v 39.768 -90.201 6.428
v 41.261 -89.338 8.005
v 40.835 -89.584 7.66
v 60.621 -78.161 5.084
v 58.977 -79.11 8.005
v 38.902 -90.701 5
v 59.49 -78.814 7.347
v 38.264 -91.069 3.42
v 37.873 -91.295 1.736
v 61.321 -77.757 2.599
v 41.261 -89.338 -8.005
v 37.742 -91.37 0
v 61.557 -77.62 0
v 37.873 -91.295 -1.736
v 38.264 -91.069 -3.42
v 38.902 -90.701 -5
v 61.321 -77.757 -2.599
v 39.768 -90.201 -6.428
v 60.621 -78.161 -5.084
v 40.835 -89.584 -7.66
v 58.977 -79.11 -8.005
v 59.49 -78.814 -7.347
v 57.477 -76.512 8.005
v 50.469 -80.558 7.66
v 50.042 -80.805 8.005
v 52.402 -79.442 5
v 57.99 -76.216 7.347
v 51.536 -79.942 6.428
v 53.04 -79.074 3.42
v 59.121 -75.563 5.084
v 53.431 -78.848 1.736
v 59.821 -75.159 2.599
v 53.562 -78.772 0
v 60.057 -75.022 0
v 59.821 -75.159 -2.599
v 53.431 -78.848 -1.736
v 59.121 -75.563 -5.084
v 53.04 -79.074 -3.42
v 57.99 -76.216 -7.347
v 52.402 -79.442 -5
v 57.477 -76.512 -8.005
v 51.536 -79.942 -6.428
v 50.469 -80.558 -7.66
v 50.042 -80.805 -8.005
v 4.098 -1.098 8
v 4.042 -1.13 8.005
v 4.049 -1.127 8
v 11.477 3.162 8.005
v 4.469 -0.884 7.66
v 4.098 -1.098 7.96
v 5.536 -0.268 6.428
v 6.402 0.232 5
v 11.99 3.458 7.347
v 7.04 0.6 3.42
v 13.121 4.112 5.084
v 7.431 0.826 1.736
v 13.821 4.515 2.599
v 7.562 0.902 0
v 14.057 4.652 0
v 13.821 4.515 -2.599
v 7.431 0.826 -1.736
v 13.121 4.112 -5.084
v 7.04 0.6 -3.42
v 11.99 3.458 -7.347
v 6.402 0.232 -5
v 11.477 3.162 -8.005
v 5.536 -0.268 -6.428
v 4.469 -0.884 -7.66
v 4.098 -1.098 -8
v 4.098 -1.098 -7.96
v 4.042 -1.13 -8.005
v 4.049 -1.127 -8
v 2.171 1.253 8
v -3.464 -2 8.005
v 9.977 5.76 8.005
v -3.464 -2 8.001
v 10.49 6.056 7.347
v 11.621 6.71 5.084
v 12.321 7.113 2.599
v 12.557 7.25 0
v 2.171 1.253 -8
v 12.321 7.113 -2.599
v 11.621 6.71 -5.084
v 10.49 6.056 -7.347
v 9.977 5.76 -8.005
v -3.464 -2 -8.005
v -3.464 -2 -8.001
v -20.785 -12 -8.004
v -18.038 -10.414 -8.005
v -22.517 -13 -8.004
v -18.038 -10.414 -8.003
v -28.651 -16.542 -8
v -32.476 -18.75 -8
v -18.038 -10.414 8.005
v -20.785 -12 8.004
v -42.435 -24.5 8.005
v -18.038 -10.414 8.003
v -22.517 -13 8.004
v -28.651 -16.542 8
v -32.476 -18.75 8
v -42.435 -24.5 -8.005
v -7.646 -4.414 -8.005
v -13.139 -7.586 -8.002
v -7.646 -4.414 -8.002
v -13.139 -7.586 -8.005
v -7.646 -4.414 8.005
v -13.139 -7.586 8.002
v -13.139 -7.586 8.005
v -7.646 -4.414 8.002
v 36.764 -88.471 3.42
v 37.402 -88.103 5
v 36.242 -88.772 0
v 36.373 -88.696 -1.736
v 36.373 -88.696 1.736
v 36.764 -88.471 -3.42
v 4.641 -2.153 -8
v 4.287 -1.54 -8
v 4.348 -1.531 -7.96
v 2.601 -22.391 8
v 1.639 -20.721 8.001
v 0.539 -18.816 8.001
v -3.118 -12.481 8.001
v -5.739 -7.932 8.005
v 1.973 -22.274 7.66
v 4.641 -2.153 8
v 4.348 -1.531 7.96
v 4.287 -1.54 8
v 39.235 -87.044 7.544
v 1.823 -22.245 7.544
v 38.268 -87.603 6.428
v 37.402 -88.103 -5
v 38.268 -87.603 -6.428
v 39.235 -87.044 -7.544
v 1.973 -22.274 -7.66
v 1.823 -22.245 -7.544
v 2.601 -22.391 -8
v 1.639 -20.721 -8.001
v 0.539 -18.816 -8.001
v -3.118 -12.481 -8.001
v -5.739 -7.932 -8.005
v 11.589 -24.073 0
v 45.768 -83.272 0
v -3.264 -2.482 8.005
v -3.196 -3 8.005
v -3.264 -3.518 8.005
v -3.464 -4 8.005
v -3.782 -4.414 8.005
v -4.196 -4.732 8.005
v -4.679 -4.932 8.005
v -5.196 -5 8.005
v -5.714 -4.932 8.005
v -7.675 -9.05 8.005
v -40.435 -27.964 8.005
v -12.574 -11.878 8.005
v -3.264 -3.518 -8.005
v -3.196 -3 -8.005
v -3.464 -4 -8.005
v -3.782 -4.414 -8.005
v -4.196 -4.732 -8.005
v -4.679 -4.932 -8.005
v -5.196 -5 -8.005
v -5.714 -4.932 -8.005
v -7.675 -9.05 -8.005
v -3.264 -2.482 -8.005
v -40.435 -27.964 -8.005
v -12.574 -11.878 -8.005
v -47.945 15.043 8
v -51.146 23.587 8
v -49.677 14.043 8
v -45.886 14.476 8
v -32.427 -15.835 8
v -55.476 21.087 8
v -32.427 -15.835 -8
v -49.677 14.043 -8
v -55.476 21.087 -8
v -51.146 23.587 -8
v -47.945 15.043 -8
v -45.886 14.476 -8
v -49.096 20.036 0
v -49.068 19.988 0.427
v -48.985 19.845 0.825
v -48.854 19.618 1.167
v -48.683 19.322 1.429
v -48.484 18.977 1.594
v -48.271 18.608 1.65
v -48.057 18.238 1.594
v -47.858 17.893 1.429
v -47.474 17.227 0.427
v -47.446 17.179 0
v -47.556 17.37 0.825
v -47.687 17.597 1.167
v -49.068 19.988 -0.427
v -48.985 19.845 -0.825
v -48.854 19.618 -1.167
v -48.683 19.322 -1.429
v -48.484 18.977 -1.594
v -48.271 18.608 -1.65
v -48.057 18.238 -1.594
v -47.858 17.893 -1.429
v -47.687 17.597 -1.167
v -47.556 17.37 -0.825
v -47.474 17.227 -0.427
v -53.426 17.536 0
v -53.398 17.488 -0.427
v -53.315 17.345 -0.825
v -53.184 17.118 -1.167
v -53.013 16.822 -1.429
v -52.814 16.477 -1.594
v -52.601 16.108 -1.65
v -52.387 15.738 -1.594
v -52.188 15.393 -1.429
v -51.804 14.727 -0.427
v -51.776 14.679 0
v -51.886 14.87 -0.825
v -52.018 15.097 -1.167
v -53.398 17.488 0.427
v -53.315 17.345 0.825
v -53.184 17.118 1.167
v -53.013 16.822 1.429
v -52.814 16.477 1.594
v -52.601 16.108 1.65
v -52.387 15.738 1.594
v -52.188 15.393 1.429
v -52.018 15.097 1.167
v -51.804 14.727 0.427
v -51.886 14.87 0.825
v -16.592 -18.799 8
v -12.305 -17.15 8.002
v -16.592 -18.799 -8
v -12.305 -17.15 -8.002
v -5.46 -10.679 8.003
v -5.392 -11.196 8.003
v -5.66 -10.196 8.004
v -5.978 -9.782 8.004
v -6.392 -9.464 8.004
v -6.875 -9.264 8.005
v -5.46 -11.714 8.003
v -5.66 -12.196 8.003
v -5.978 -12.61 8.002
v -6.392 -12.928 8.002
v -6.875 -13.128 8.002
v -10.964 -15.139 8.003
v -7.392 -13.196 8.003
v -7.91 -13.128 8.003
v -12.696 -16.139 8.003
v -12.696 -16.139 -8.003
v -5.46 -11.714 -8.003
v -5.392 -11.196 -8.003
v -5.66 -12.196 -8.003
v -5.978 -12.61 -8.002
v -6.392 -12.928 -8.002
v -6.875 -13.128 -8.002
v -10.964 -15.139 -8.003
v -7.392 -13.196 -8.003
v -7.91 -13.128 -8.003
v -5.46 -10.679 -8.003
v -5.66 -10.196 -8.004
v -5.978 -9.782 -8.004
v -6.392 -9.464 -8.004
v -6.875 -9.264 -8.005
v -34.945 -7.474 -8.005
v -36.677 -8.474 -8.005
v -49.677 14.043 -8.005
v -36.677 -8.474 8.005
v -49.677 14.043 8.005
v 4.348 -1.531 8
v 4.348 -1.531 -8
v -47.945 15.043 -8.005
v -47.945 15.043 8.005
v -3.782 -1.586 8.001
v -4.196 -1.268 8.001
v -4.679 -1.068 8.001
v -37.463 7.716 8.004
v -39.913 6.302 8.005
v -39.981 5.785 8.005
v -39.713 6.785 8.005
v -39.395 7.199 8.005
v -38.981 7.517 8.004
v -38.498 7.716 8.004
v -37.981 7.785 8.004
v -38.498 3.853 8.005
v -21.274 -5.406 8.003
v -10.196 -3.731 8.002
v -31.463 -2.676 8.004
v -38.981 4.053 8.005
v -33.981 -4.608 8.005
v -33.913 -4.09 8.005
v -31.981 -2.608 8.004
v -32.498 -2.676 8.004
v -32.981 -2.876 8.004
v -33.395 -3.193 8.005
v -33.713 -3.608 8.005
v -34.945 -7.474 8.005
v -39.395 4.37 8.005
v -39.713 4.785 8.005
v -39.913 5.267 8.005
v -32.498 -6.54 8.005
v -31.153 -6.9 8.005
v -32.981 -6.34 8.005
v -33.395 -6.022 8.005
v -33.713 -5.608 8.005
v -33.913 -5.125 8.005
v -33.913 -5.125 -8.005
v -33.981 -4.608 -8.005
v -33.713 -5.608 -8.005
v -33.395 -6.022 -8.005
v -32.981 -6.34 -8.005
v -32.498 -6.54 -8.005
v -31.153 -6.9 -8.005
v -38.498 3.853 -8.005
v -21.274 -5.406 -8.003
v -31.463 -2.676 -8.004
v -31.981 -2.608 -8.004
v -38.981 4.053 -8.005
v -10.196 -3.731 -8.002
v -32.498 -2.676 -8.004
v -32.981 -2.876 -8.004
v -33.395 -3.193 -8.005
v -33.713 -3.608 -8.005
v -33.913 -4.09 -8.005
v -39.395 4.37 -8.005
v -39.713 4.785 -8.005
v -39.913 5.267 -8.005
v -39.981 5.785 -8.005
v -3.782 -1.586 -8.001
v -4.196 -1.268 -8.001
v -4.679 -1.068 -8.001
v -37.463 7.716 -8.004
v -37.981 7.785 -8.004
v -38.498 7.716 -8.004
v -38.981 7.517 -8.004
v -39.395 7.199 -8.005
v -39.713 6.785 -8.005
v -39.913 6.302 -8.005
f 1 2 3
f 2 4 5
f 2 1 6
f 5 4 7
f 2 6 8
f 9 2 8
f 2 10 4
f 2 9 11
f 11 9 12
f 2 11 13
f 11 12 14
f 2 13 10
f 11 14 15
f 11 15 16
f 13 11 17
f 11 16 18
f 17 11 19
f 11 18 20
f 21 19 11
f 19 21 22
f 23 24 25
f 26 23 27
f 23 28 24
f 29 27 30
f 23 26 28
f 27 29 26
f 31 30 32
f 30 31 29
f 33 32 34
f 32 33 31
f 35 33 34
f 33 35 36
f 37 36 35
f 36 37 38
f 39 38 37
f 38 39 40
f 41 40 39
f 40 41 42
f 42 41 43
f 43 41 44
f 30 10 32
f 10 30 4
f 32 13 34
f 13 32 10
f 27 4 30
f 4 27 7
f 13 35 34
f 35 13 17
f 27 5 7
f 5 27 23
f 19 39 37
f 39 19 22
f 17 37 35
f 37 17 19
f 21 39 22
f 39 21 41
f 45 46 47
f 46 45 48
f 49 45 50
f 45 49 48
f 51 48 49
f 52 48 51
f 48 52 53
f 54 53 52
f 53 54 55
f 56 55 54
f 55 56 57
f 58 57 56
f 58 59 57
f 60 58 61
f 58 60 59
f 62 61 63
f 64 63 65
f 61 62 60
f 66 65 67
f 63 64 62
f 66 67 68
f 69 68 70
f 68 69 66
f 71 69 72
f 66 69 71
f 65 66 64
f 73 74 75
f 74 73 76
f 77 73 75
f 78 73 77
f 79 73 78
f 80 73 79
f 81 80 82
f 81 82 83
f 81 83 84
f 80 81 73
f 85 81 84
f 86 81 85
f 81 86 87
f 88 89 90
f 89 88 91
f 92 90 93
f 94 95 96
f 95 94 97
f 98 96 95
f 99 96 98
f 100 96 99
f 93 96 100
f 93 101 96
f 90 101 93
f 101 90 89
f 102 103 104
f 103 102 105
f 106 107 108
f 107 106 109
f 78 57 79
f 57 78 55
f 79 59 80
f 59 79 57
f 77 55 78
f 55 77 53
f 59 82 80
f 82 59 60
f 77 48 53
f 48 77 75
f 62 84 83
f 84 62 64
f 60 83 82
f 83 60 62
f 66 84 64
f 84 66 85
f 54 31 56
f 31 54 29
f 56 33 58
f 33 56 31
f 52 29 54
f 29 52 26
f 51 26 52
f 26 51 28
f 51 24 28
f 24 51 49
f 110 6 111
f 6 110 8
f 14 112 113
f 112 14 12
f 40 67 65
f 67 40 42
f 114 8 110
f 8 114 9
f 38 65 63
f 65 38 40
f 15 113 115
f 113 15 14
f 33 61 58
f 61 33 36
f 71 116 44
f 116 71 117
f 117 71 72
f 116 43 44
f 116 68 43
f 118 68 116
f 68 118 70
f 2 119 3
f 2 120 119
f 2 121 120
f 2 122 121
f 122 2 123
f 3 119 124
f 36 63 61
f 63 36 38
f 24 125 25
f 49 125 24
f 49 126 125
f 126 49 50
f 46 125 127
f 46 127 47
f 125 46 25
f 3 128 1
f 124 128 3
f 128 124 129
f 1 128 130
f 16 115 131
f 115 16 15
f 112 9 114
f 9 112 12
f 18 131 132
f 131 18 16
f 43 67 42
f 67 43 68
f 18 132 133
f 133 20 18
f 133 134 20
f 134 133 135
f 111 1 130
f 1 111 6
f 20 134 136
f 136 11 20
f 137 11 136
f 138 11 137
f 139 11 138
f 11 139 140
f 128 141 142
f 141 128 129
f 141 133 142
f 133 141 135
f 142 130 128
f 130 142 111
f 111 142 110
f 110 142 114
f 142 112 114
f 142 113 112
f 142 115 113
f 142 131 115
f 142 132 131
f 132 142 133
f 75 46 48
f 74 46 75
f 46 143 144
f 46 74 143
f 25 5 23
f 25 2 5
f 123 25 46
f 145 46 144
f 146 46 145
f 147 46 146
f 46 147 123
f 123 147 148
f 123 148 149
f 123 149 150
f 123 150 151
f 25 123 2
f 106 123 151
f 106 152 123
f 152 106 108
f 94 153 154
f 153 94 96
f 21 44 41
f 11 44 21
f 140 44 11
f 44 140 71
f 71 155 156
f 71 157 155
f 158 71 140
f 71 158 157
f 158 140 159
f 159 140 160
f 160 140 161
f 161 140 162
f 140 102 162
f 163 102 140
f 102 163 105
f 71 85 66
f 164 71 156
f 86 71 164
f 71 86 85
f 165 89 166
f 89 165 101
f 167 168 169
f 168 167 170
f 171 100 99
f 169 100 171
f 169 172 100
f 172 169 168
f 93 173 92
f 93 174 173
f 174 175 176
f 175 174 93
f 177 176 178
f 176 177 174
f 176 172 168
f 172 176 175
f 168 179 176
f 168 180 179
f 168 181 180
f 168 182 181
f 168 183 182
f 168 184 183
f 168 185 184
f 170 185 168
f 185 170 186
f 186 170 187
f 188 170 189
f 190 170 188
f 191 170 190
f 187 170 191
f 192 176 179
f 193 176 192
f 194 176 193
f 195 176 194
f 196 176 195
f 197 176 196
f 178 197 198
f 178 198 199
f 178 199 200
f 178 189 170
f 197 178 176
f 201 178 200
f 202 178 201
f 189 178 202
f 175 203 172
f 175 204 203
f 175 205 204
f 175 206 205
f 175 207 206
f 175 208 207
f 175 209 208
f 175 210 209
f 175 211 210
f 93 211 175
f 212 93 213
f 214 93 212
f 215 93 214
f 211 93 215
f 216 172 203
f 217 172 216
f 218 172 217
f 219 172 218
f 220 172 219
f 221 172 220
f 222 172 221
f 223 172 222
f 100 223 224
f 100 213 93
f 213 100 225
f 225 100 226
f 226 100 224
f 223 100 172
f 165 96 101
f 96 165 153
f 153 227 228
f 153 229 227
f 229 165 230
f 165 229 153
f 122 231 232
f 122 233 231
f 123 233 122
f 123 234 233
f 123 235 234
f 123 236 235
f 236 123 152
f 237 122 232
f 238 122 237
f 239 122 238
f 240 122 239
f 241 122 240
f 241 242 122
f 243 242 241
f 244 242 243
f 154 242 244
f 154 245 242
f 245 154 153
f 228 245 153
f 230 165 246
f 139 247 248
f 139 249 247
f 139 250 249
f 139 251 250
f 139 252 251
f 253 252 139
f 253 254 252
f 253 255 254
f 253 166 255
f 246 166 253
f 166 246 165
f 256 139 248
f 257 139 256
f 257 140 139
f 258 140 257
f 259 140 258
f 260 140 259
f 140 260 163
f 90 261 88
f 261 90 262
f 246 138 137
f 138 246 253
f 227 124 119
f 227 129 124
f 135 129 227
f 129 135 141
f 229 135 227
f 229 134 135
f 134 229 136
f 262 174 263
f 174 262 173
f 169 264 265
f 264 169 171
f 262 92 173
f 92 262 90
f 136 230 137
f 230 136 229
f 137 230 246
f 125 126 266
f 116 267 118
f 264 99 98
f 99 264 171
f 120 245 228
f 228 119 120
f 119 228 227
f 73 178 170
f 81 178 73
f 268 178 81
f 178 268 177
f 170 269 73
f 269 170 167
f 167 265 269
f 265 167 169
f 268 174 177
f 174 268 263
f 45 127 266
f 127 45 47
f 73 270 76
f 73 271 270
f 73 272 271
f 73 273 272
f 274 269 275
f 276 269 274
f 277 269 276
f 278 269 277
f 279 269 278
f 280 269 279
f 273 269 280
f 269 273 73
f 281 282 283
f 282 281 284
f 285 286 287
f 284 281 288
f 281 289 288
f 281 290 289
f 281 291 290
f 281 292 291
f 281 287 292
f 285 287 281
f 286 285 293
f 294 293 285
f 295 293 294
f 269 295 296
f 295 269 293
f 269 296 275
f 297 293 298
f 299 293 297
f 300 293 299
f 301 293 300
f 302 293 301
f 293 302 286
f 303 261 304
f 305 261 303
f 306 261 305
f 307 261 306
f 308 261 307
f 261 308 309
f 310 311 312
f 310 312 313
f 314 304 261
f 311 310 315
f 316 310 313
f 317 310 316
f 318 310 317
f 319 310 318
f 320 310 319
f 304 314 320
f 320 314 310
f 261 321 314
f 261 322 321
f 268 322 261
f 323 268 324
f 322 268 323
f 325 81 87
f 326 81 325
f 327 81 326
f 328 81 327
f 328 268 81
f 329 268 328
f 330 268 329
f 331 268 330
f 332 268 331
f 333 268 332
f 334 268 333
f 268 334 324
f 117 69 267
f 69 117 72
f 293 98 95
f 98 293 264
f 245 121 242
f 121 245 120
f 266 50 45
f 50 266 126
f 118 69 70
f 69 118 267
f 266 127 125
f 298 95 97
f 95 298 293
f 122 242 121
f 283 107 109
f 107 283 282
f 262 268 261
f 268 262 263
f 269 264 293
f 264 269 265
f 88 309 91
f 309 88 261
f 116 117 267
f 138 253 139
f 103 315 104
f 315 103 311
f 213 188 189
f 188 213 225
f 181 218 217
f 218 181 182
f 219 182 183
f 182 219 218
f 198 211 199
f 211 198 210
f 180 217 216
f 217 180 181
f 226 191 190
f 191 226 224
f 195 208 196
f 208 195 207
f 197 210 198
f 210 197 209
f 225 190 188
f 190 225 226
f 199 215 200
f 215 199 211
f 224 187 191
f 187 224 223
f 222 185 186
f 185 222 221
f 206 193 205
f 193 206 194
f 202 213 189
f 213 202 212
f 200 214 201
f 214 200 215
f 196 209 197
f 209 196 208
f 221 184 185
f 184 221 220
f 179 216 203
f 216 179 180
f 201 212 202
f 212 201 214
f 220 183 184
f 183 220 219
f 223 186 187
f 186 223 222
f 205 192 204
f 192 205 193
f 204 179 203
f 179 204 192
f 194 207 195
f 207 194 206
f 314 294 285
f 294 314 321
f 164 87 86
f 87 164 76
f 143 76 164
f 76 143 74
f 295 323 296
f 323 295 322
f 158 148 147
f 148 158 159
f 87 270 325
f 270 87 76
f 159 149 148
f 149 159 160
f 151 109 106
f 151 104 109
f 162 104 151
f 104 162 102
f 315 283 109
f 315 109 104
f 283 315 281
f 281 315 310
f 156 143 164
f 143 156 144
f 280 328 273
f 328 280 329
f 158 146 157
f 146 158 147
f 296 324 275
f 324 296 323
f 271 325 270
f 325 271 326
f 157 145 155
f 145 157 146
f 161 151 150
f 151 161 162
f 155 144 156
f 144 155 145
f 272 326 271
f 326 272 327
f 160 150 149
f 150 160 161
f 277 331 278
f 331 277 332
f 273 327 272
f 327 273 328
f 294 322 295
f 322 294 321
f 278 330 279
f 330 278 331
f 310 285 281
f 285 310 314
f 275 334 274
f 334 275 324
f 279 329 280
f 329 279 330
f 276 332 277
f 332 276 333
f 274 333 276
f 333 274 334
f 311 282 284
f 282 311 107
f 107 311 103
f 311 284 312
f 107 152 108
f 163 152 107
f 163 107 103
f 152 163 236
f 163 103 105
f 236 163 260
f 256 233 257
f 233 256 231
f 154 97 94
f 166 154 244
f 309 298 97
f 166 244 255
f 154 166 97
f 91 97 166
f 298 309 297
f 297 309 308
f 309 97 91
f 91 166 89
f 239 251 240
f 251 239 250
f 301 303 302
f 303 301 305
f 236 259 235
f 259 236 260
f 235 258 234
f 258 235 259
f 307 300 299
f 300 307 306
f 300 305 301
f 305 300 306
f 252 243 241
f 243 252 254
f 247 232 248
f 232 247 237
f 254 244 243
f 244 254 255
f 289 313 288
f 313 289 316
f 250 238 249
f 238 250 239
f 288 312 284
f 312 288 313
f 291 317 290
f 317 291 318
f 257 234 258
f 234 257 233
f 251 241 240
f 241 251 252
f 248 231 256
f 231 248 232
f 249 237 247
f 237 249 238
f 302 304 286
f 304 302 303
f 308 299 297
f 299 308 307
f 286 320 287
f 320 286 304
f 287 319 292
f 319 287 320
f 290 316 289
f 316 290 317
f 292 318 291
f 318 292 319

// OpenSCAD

// thickness of the holder (z height)
height = 16;

// how far to raise the holder (20-100)
raiser = 35;

// base mount thickness (you need to 16 to this to get the M3 screw needed - ie, thickess of 9mm would need a M3d 25mm)
base_thickness = 5;

// end caps
cap_size = 25;

// length of the holder (thickness of the spool)
length = 92;

/* [Hidden] */

len = length + 6;

epsilon = 0.01;

module printrbot_holder()
{    
    difference() {
    
        union() {
        intersection() {
            difference() {    
                union() {
            
                    // spool support
                    translate([len/2, -6, 0])
                        cube([len, 2*cap_size, height+epsilon], center=true);

                }
            }

            difference()
            {
                union() {
                    rotate([90,0,90])
                    {
                        // round the support
                        translate([-3.0, 0, len/2 -cap_size/2])
                            cylinder(r=height/2 + 2, h=2*len, center=true , $fn=36);

                        
                        // far end stop
                        translate([2, 0, len - 3/2]) {
                            intersection() {
                                cube([cap_size,cap_size,3], center=true);
                                cylinder(r=cap_size*0.5, h=3, center=true);
                            }
                        }
                        
                        // base end stop
                        translate([2, 0, 3/2]) {
                            intersection() {
                                cube([cap_size,cap_size,3], center=true);
                                cylinder(r=cap_size*0.5, h=3, center=true);
                            }
                        }

                    }
                } // union
                    
                rotate([90,0,90])
                    translate([-10, 0, len/2])
                    cylinder(r=height/2, h=len - 3 - 3 , center=true , $fn=4);
            }
        }
        
        
        difference()
        {
            union() {
                
                // attach lip
                translate([-46/2, -raiser,0])
                    cube([46, base_thickness, height], center=true);
                
                // raiser
                hull() {
                    translate([2,-(raiser+14)/2,0])
                        cube([4, (raiser+14), height+epsilon], center=true);

                    translate([10,0,0])
                    rotate([90,0,90])
                        intersection() {
                            cube([3, height, 3], center=true);
                                cylinder(r=cap_size*0.5, h=3, center=true);
                        }
                    
                }

                hull() {
                    translate([-12,-raiser,0])
                        cube([2, 2, height+epsilon], center=true);

                    translate([26,0,0])
                    rotate([90,0,90])
                        intersection() {
                            cube([2, height, 3], center=true);
                                cylinder(r=cap_size*0.5, h=3, center=true);
                        }
                 
                    translate([-36,-raiser,0])
                        cube([2, 2, height+epsilon], center=true);

        
                    translate([2,2,0])
                    rotate([90,0,90])
                        intersection() {
                            cube([2, height, 3], center=true);
                                cylinder(r=cap_size*0.5, h=3, center=true);
                        }
                        
                    
                    // bottom    
                    #translate([-4,-raiser,0])
                    rotate([90,0,90])
                        intersection() {
                            cube([2, height, 3], center=true);
                                cylinder(r=cap_size*0.5, h=3, center=true);
                        }
                        

                }
                
            }
            
            
            // attach screw
            translate([-40.25,-30,0])
                rotate([90,0,0])
                cylinder(r=3.3/2, h=20, $fn=24, center=true);
            
        }
    }
    
        hull() {
            translate([-24,-raiser + 5,0])
                cylinder(r=2, h=height+epsilon, $fn=24, center=true);

            translate([0,-6,0])
                cylinder(r=2, h=height+2*epsilon, $fn=24, center=true);
        }

        hull() {
            translate([-12,-raiser + 5,0])
                cylinder(r=2, h=height+epsilon, $fn=24, center=true);

            translate([12 - 6,-6 - 6,0])
                cylinder(r=2, h=height+2*epsilon, $fn=24, center=true);
        }
        
    }

}


rotate([0,0,-60])
    printrbot_holder();
